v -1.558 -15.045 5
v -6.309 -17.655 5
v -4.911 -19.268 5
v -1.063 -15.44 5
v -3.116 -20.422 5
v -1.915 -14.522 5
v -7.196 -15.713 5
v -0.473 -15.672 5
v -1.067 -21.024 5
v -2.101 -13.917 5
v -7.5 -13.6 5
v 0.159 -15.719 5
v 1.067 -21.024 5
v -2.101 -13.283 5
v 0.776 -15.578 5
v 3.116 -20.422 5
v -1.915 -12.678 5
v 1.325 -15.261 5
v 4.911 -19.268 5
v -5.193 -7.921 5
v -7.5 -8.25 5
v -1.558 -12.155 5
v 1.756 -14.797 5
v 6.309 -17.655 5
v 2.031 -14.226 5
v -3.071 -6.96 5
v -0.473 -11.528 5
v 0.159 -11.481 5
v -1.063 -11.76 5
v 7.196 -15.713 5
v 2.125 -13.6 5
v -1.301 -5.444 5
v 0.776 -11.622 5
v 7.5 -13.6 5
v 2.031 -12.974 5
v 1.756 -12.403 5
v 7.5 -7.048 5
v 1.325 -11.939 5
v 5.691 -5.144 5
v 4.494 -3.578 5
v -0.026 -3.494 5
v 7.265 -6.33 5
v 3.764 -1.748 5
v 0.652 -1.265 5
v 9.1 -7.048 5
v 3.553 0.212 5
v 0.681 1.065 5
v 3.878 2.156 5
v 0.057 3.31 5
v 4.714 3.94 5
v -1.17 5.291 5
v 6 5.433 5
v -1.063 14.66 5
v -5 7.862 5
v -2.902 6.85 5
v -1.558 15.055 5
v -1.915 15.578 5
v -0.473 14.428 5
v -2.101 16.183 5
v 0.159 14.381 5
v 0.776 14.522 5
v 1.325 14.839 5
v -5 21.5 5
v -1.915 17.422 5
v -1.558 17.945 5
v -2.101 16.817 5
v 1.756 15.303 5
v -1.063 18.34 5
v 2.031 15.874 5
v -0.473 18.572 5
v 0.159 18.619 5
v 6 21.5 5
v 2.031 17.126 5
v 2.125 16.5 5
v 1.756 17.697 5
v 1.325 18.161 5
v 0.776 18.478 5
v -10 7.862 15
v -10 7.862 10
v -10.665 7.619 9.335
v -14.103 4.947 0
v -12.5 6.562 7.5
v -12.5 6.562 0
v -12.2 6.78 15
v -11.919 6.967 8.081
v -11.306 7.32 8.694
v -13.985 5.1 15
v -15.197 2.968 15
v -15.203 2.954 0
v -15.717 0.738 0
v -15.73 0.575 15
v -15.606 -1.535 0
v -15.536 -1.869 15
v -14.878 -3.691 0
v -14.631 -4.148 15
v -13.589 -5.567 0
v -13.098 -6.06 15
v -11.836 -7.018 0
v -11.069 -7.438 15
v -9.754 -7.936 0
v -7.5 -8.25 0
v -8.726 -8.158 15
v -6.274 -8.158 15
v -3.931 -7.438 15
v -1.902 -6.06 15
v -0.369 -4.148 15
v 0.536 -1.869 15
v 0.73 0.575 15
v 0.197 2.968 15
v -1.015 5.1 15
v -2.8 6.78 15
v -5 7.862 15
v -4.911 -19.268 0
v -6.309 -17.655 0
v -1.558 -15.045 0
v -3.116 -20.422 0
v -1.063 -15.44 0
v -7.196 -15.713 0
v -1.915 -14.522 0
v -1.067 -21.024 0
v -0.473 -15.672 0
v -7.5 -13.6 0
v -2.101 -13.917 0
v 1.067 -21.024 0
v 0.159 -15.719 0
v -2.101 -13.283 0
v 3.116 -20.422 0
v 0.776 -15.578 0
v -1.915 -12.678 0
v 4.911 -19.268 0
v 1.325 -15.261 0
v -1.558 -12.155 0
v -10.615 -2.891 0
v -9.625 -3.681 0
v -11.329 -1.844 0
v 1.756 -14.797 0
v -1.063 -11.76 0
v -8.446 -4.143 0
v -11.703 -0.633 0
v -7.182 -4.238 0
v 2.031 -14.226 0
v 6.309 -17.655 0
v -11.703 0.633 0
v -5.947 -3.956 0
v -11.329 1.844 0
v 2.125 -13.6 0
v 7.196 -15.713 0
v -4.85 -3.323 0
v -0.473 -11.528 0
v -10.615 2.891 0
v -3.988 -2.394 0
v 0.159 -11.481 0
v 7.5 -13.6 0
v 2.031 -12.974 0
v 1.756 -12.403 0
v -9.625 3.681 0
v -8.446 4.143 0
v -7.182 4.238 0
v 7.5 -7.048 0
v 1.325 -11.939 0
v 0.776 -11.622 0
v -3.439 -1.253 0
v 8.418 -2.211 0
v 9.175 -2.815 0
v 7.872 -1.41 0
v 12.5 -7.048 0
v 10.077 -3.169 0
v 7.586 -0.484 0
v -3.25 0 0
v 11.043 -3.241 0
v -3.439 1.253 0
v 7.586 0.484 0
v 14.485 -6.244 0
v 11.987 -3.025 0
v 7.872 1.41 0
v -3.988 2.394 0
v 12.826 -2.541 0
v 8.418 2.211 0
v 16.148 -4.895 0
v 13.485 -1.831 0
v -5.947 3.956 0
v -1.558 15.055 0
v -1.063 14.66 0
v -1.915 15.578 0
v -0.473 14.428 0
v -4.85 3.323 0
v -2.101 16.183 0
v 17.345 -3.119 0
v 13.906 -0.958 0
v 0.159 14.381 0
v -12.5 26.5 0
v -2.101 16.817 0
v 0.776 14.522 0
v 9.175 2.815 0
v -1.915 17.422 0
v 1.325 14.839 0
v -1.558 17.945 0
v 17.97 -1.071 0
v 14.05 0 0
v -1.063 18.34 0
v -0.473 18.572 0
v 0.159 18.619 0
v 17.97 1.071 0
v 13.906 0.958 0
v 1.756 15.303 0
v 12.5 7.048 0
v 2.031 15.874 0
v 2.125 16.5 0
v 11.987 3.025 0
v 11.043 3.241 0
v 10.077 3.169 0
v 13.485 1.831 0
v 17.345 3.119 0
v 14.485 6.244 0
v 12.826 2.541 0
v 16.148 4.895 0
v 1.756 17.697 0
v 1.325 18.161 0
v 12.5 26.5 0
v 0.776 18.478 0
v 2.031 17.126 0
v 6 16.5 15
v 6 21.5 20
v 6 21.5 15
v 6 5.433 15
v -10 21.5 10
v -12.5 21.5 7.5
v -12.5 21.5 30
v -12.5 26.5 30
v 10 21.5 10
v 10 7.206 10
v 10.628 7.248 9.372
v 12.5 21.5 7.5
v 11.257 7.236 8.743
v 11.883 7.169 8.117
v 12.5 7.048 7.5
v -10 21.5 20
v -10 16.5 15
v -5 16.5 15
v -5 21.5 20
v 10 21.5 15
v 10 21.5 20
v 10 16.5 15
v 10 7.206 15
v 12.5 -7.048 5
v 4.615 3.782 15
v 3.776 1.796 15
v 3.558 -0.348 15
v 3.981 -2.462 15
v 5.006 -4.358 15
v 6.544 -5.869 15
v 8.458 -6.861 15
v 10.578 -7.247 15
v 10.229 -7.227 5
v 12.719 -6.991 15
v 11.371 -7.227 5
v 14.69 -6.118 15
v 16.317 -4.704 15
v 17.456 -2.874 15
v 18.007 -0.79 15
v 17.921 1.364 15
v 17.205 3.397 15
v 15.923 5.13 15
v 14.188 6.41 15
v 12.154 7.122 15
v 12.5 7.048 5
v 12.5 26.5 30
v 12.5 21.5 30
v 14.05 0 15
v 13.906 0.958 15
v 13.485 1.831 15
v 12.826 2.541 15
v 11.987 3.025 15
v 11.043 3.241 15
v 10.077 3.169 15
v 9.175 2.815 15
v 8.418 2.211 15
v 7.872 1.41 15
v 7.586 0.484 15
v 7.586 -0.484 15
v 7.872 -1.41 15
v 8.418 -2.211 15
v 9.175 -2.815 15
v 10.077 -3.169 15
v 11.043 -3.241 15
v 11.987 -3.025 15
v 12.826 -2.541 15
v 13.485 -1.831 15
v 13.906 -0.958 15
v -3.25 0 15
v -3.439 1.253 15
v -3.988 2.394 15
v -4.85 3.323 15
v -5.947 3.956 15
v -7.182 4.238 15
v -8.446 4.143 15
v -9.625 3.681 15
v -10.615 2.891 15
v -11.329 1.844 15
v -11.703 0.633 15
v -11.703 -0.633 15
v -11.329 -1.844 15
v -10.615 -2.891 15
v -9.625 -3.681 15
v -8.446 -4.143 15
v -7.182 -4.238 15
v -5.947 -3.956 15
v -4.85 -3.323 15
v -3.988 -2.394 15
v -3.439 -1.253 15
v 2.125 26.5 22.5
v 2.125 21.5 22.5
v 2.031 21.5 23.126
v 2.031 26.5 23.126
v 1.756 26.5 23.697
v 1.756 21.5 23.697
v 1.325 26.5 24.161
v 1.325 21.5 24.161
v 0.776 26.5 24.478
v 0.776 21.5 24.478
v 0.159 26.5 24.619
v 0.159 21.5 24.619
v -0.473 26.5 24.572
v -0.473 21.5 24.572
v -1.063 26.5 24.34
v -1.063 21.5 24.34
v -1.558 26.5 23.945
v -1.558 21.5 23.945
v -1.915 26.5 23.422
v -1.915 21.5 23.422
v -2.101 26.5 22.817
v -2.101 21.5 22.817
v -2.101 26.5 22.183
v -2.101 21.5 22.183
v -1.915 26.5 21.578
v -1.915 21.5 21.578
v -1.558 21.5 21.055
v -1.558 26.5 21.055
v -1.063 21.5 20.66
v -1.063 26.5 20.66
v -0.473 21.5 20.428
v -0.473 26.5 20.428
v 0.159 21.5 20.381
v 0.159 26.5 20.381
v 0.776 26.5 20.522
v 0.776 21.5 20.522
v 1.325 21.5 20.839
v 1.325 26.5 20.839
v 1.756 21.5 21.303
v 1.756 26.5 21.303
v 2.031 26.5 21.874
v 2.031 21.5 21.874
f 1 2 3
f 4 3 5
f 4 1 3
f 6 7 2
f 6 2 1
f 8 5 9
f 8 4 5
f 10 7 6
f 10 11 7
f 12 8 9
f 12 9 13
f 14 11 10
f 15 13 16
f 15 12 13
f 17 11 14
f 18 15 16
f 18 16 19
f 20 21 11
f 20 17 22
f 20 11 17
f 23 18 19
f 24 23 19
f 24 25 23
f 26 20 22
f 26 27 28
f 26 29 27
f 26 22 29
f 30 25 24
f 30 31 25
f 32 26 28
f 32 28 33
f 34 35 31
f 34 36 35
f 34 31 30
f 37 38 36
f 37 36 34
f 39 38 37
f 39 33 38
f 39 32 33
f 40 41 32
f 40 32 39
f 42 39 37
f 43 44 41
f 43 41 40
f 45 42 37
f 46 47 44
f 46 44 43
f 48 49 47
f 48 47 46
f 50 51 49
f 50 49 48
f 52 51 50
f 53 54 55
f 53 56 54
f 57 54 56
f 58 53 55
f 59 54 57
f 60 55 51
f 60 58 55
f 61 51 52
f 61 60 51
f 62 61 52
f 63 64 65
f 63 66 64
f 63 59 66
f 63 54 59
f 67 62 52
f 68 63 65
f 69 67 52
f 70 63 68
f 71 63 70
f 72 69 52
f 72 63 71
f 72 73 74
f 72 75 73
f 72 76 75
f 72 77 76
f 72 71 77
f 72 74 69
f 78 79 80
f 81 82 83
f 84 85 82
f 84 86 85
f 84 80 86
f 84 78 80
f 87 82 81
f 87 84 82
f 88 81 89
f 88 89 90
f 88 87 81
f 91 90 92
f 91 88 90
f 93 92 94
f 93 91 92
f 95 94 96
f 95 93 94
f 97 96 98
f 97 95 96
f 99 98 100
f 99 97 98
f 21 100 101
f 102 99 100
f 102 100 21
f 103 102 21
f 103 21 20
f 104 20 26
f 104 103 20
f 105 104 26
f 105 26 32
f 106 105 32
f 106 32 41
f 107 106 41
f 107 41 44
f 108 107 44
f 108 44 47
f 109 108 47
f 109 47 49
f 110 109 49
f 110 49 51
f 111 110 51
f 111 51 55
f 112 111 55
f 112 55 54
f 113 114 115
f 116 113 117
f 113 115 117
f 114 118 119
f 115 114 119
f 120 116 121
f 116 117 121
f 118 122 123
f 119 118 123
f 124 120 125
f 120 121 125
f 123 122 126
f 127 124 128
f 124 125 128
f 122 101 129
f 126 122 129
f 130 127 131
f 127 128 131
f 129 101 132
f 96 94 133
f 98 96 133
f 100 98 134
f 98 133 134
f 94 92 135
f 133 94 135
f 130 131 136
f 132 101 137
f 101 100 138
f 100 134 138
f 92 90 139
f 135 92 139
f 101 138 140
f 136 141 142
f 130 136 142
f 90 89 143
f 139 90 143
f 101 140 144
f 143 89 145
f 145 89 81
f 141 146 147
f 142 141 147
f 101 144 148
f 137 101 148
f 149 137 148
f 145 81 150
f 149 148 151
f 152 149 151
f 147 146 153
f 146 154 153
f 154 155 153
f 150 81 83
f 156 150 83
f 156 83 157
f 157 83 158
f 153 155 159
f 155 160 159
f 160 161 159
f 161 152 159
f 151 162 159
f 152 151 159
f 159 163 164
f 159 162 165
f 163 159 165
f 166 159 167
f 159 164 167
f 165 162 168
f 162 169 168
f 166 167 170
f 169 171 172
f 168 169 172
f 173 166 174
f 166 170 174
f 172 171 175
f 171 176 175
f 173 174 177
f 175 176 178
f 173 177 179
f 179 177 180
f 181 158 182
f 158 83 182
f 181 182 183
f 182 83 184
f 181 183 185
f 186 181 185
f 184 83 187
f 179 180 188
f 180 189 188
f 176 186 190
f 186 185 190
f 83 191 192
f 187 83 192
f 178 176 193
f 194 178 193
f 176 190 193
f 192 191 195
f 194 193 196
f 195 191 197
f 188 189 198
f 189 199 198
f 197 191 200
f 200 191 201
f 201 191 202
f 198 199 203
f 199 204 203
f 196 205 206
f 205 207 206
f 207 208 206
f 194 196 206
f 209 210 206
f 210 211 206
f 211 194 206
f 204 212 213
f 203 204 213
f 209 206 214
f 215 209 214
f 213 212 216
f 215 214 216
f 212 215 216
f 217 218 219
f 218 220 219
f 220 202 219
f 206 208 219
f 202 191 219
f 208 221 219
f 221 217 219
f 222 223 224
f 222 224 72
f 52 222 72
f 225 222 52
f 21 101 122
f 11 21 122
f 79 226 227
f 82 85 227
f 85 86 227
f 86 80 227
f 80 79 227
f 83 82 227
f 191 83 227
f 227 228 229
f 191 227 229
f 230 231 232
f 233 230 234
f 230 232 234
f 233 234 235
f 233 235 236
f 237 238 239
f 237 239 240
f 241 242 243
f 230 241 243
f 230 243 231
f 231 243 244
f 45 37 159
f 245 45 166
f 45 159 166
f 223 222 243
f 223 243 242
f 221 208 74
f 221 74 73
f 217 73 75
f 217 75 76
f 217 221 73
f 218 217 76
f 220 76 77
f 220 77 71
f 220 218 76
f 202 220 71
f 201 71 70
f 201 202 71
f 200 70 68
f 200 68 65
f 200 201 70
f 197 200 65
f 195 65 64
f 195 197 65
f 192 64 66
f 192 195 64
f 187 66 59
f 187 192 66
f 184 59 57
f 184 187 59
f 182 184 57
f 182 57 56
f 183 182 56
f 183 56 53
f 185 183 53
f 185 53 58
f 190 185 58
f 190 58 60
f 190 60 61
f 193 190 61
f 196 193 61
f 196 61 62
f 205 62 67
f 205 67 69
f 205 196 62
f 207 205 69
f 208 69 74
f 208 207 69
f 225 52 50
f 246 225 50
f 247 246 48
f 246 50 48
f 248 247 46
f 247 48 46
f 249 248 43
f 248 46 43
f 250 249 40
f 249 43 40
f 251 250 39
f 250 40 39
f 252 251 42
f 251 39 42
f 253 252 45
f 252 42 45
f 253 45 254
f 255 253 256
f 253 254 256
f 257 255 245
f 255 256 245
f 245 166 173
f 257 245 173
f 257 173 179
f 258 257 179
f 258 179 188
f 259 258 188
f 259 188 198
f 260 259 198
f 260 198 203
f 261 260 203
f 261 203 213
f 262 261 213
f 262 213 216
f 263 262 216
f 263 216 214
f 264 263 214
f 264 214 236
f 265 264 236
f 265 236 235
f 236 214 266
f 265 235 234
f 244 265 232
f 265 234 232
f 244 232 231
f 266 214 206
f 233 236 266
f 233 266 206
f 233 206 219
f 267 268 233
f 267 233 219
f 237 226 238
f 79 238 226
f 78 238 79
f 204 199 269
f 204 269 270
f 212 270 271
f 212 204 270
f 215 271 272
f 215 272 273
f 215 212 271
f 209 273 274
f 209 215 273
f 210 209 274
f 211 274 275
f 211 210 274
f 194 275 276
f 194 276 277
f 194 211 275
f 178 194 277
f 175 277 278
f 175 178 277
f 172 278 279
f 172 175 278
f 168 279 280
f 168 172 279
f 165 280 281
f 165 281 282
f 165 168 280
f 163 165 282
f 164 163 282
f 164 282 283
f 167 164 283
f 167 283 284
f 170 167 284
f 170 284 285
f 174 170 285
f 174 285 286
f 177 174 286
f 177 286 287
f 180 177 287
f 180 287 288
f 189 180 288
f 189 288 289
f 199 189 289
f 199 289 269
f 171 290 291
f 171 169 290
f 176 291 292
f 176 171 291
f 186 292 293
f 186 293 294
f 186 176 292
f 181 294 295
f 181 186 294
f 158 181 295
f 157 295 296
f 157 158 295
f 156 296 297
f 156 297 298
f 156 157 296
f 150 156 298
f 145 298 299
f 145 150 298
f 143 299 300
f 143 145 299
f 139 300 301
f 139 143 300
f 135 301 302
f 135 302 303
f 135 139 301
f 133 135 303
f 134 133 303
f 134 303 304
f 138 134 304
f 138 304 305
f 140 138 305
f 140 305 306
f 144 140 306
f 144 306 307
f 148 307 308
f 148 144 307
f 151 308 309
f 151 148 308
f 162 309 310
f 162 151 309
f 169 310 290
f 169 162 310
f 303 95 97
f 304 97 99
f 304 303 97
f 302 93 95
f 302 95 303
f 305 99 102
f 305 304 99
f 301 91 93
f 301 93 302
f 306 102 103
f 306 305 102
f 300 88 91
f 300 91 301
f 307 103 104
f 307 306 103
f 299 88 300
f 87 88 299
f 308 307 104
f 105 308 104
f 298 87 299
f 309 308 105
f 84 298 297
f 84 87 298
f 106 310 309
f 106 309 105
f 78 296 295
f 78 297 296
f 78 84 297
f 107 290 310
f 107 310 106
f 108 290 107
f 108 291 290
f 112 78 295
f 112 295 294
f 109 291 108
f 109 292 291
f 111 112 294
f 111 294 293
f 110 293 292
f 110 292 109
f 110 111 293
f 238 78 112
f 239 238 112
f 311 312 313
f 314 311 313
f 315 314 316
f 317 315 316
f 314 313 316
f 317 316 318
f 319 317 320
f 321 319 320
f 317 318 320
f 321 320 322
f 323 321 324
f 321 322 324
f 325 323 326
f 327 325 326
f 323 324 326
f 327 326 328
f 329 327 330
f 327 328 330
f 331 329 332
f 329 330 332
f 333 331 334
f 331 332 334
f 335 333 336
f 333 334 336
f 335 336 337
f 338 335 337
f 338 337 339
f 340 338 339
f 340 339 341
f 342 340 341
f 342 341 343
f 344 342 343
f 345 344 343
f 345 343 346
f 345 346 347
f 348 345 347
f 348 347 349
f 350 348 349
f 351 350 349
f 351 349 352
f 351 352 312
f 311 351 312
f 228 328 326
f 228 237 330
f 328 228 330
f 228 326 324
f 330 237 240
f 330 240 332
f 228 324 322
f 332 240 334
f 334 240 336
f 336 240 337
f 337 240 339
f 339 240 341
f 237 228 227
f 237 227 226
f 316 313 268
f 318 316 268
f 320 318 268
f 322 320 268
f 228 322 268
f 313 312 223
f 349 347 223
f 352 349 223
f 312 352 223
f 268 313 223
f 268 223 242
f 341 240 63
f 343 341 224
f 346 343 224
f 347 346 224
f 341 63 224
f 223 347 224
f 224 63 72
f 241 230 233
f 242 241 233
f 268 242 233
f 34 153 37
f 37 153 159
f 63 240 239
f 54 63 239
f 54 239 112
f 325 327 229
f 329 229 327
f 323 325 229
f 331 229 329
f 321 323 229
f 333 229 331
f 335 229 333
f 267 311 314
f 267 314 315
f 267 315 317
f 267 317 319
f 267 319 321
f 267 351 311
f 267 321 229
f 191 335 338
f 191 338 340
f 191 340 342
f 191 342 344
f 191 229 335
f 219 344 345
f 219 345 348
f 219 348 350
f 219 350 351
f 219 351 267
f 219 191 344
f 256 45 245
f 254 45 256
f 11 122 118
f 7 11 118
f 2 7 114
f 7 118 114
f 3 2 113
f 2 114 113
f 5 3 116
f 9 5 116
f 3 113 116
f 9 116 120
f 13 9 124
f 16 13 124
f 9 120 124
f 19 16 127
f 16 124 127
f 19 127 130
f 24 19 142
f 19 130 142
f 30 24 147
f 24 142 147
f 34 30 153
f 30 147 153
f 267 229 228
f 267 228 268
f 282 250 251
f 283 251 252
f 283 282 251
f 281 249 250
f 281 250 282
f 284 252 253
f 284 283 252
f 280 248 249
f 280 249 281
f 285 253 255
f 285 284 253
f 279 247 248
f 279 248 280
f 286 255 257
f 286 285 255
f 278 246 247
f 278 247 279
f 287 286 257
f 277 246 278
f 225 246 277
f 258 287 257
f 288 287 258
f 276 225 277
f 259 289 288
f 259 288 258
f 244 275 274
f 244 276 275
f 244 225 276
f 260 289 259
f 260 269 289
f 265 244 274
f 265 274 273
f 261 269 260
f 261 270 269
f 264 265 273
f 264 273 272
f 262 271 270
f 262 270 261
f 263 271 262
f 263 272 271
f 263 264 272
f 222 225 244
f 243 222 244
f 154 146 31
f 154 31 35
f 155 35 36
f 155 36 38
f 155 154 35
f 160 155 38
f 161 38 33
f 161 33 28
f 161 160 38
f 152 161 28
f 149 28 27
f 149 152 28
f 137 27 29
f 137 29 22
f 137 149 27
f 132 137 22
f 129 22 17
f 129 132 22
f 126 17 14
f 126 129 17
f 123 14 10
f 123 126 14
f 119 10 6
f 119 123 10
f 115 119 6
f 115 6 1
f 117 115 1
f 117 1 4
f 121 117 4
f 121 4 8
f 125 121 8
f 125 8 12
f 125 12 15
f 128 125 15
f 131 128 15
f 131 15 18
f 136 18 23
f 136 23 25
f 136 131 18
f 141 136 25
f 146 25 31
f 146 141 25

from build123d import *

# Parameters (mm, degrees)
F0_R          = 2.125
F0_R_2        = 4.25
F0_R_3        = 3.25
F1_DEPTH      = 5
F2_W          = 25
F2_H          = 5
F3_DEPTH      = 25
F4_R          = 8.25
F4_R_2        = 4.25
F4_R_3        = 7.25
F4_R_4        = 3.25
F5_DEPTH      = 10
F6_R          = 2.125
F7_DEPTH      = 5.001
F8_W          = 5
F8_H          = 13.6379074032
F8_W_2        = 4
F8_H_2        = 16.0665388563
F9_DEPTH      = 10
F10_T1_DEPTH  = 5
F10_T3_DEPTH  = 4
F10_T8_DEPTH  = 17.8584149398
F10_T13_DEPTH = 16.8584149398
F10_T18_DEPTH = 26.4963223431
F10_S19_R     = 8.25
F10_T20_DEPTH = 15
F10_T25_DEPTH = 26.4963223431
F10_S26_R     = 8.25
F10_T27_DEPTH = 15
F10_T32_DEPTH = 27.1526880508
F10_S34_R     = 7.25
F10_T35_DEPTH = 16


# Not quite as in the source:
# - a fillet or chamfer that OpenCascade refuses, or shapes differently, is made with other operations: its cross-section is extruded or revolved along the edge and cut away or added


with BuildPart() as f1:
    # F0 (on Top) → F1 (new body)
    with BuildSketch(Plane.XY):
        with BuildLine():
            Line((12.5, 26.5), (0, 26.5))
            Line((0, 26.5), (-12.5, 26.5))
            Line((-12.5, 26.5), (-12.5, 6.5622023742))
            ThreePointArc((-12.5, 6.5622023742), (-15.3166703137, -2.6385915194), (-7.5, -8.25))
            Line((-7.5, -8.25), (-7.5, -13.6))
            ThreePointArc((-7.5, -13.6), (-5.3033008589, -18.9033008589), (0, -21.1))
            ThreePointArc((0, -21.1), (5.3033008589, -18.9033008589), (7.5, -13.6))
            Line((7.5, -13.6), (7.5, -7.0478720193))
            Line((7.5, -7.0478720193), (12.5, -7.0478720193))
            ThreePointArc((12.5, -7.0478720193), (18.05, 0), (12.5, 7.0478720193))
            Line((12.5, 7.0478720193), (12.5, 26.5))
        make_face()
        with Locations((0, -13.6)):
            Circle(F0_R, mode=Mode.SUBTRACT)
        with Locations((-7.5, 0)):
            Circle(F0_R_2, mode=Mode.SUBTRACT)
        with Locations((10.8, 0)):
            Circle(F0_R_3, mode=Mode.SUBTRACT)
        with Locations((0, 16.5)):
            Circle(F0_R, mode=Mode.SUBTRACT)
    extrude(amount=F1_DEPTH)

    # F2 (on face) → F3 (join)
    with BuildSketch(Plane.XY.offset(5)):
        with Locations((0, 24)):
            Rectangle(F2_W, F2_H)
    extrude(amount=F3_DEPTH)

    # F4 (on face) → F5 (join)
    with BuildSketch(Plane.XY.offset(5)):
        with Locations((-7.5, 0)):
            Circle(F4_R)
        with Locations((-7.5, 0)):
            Circle(F4_R_2, mode=Mode.SUBTRACT)
        with Locations((10.8, 0)):
            Circle(F4_R_3)
        with Locations((10.8, 0)):
            Circle(F4_R_4, mode=Mode.SUBTRACT)
    extrude(amount=F5_DEPTH)

    # F6 (on face) → F7 (cut, through all)
    with BuildSketch(Plane.XZ.offset(-21.5)):
        with Locations((0, 22.5)):
            Circle(F6_R)
    extrude(amount=-F7_DEPTH, mode=Mode.SUBTRACT)

    # F8 (on face) → F9 (join)
    with BuildSketch(Plane.XY.offset(5)):
        with Locations((-7.5, 14.6810462984)):
            Rectangle(F8_W, F8_H)
        with Locations((8, 13.4667305718)):
            Rectangle(F8_W_2, F8_H_2)
    extrude(amount=F9_DEPTH)

    # F10: chamfer of 5 on 4 edges, made by hand

    # F10_s2 → F10_t1 (join)
    with BuildSketch(Plane.YZ.offset(-10)):
        Polygon((16.5, 15), (21.5, 20), (21.5, 15), align=None)
    extrude(amount=F10_T1_DEPTH)

    # F10_s4 → F10_t3 (join)
    with BuildSketch(Plane.YZ.offset(6)):
        Polygon((16.5, 15), (21.5, 20), (21.5, 15), align=None)
    extrude(amount=F10_T3_DEPTH)


with BuildPart() as f10_tool6:
    # F10_s7 → F10_t8 (new body)
    with BuildSketch(Plane.YZ.offset(7.8584149398)):
        Polygon((16.5, 15), (21.5, 20), (21.5, 15), align=None)
    extrude(amount=-F10_T8_DEPTH)

    split(bisect_by=Plane.YZ.offset(6), keep=Keep.TOP)


with BuildPart() as f1_1:
    add(f1.part)

    # F10_t5: union F10_tool6
    add(f10_tool6.part)


with BuildPart() as f10_tool11:
    # F10_s12 → F10_t13 (new body)
    with BuildSketch(Plane.YZ.offset(10)):
        Polygon((16.5, 15), (21.5, 20), (21.5, 15), align=None)
    extrude(amount=-F10_T13_DEPTH)

    split(bisect_by=Plane.YZ.offset(-5), keep=Keep.BOTTOM)


with BuildPart() as f1_2:
    add(f1_1.part)

    # F10_t10: union F10_tool11
    add(f10_tool11.part)


with BuildPart() as f10_tool16:
    # F10_s17 → F10_t18 (new body)
    with BuildSketch(Plane.XZ.offset(-21.5)):
        Polygon((-10, 10), (-15, 5), (-10, 5), align=None)
    extrude(amount=F10_T18_DEPTH)

    # F10_s19 → F10_t20 (cut, symmetric)
    with BuildSketch(Plane.XY.offset(7.5)):
        with Locations((-7.5, 0)):
            Circle(F10_S19_R)
    extrude(amount=F10_T20_DEPTH, both=True, mode=Mode.SUBTRACT)

    split(bisect_by=Plane.YZ.offset(-12.5), keep=Keep.TOP)


with BuildPart() as f1_3:
    add(f1_2.part)

    # F10_t15: union F10_tool16
    add(f10_tool16.part)


with BuildPart() as f10_tool23:
    # F10_s24 → F10_t25 (new body)
    with BuildSketch(Plane.XZ.offset(-21.5)):
        Polygon((-10, 10), (-15, 5), (-10, 5), align=None)
    extrude(amount=F10_T25_DEPTH)

    # F10_s26 → F10_t27 (intersect, symmetric)
    with BuildSketch(Plane.XY.offset(7.5)):
        with Locations((-7.5, 0)):
            Circle(F10_S26_R)
    extrude(amount=F10_T27_DEPTH, both=True, mode=Mode.INTERSECT)

    split(bisect_by=Plane.YZ.offset(-12.5), keep=Keep.BOTTOM)


with BuildPart() as f1_4:
    add(f1_3.part)

    # F10_t22: union F10_tool23
    add(f10_tool23.part)


with BuildPart() as f10_tool30:
    # F10_s31 → F10_t32 (new body)
    with BuildSketch(Plane.XZ.offset(5.6526880508)):
        Polygon((10, 10), (15, 5), (10, 5), align=None)
    extrude(amount=-F10_T32_DEPTH)

    split(bisect_by=Plane.YZ.offset(12.5), keep=Keep.BOTTOM)

    # F10_s34 → F10_t35 (cut, symmetric)
    with BuildSketch(Plane.XY.offset(7.5)):
        with Locations((10.8, 0)):
            Circle(F10_S34_R)
    extrude(amount=F10_T35_DEPTH, both=True, mode=Mode.SUBTRACT)


with BuildPart() as f1_5:
    add(f1_4.part)

    # F10_t29: union F10_tool30
    add(f10_tool30.part)


solid = f1_5.part
